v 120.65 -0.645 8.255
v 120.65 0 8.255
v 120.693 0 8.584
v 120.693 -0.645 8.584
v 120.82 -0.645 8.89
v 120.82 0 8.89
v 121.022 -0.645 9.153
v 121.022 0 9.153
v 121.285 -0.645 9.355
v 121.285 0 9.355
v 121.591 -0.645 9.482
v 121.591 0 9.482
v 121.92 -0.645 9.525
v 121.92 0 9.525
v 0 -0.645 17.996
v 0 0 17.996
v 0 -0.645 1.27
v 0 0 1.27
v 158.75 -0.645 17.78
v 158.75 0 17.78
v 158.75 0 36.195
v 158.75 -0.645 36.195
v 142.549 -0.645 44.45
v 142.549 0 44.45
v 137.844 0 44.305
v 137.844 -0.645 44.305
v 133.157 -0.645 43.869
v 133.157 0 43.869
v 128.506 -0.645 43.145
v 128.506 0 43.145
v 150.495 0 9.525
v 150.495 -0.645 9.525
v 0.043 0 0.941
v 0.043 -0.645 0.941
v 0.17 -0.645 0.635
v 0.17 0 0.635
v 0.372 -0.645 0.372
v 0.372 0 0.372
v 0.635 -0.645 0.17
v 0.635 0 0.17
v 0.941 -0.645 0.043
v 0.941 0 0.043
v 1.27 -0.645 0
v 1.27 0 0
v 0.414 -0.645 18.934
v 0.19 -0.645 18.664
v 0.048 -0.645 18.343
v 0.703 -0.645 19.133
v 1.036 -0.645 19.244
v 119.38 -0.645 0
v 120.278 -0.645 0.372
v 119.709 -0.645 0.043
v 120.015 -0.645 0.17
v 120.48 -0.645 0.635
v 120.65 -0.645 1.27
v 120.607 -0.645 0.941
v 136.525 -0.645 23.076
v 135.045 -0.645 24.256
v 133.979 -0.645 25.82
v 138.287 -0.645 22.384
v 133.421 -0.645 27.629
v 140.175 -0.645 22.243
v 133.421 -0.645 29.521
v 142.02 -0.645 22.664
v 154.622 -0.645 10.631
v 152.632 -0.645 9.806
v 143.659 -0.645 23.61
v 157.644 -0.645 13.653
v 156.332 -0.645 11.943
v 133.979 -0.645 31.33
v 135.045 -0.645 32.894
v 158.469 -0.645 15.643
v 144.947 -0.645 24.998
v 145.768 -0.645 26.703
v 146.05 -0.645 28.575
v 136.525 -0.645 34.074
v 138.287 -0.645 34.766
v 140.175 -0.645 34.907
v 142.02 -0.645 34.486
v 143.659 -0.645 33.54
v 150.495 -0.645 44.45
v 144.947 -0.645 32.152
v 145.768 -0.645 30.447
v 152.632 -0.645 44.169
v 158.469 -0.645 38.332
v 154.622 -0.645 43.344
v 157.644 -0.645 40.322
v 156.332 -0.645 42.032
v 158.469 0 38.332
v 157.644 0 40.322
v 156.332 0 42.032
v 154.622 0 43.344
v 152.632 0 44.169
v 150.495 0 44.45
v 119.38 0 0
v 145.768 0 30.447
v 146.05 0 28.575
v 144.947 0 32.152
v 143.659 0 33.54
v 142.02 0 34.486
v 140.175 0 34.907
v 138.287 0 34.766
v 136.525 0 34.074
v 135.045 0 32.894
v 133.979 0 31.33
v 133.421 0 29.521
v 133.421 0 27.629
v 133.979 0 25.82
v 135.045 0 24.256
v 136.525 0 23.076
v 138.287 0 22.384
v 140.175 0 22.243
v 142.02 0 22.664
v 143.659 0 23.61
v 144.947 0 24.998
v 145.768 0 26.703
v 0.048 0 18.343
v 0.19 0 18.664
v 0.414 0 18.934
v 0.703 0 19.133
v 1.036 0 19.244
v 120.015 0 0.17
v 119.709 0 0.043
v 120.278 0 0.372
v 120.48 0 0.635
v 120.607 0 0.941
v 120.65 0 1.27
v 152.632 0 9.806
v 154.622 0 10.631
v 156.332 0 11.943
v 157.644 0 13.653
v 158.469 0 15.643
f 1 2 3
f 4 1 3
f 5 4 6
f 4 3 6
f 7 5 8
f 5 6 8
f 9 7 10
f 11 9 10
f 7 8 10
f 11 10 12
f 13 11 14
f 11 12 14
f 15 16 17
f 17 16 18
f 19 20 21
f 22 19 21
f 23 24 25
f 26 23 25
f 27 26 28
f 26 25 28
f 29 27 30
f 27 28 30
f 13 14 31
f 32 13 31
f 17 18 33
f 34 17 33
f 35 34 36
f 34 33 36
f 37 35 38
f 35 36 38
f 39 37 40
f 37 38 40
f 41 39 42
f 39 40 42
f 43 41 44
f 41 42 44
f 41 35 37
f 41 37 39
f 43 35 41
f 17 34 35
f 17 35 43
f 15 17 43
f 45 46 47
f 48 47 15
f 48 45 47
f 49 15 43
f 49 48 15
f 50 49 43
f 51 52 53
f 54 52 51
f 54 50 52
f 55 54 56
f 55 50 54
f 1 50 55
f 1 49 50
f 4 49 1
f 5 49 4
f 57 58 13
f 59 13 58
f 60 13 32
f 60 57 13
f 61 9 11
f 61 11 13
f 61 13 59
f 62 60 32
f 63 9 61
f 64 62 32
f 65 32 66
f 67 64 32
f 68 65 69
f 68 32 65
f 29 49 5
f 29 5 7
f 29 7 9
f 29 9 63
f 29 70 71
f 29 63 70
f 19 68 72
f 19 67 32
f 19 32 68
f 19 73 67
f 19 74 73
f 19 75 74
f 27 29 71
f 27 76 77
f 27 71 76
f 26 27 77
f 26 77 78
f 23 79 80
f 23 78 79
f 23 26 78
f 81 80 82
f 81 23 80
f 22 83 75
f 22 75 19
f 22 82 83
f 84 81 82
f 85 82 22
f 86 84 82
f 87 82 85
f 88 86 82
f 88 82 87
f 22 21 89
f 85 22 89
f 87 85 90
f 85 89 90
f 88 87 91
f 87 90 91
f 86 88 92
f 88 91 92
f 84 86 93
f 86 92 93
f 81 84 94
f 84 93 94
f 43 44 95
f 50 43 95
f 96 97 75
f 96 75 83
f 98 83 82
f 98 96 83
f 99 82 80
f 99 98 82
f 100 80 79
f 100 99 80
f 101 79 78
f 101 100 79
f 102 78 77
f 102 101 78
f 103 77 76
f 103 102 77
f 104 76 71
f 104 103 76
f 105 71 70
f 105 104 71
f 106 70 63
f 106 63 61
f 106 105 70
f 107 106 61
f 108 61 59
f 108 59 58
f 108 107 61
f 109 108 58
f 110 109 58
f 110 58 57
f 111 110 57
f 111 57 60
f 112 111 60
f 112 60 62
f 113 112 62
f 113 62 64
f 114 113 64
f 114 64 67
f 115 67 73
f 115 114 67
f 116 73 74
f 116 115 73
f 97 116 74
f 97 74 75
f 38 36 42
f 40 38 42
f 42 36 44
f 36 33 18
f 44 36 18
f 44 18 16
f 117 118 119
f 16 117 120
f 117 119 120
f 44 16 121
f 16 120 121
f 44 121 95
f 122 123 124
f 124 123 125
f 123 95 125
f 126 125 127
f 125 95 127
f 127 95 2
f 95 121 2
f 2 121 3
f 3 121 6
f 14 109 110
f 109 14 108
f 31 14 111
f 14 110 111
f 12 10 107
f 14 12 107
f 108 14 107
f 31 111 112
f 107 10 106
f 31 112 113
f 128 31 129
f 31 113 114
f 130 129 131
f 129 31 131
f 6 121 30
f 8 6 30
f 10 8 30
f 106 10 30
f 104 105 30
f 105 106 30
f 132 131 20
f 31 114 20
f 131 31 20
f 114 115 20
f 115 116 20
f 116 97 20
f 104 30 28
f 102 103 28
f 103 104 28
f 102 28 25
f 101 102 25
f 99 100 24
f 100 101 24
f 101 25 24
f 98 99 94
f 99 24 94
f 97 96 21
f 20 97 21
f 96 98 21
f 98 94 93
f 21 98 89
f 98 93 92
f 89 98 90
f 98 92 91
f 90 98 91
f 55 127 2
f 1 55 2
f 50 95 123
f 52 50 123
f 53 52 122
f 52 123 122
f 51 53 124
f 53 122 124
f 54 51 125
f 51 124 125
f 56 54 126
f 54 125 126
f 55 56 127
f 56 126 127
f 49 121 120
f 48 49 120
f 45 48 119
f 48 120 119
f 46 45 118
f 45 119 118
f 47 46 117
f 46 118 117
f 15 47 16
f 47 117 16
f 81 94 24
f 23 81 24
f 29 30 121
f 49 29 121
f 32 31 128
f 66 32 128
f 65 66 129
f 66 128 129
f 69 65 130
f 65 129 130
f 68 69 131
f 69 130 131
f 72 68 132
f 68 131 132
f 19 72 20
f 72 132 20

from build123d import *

# Parameters (mm, degrees)
F0_R     = 6.35
F1_DEPTH = 0.64516


with BuildPart() as f1:
    # F0 (on Front) → F1 (new body)
    with BuildSketch(Plane.XZ):
        with BuildLine():
            ThreePointArc((0, 1.27), (0.371974, 0.371974), (1.27, 0))
            Line((1.27, 0), (119.38, 0))
            ThreePointArc((119.38, 0), (120.278026, 0.371974), (120.65, 1.27))
            Line((120.65, 1.27), (120.65, 8.255))
            ThreePointArc((120.65, 8.255), (121.021974, 9.153026), (121.92, 9.525))
            Line((121.92, 9.525), (150.495, 9.525))
            ThreePointArc((150.495, 9.525), (156.332166, 11.942834), (158.75, 17.78))
            Line((158.75, 17.78), (158.75, 36.195))
            ThreePointArc((158.75, 36.195), (156.332166, 42.032166), (150.495, 44.45))
            Line((150.495, 44.45), (142.54871, 44.45))
            ThreePointArc((142.54871, 44.45), (135.497057, 44.123014), (128.505923, 43.144861))
            Line((128.505923, 43.144861), (1.035954, 19.244241))
            ThreePointArc((1.035954, 19.244241), (0.292723, 18.807061), (0, 17.995994))
            Line((0, 17.995994), (0, 1.27))
        make_face()
        with Locations((139.7, 28.575)):
            Circle(F0_R, mode=Mode.SUBTRACT)
    extrude(amount=F1_DEPTH)


solid = f1.part
